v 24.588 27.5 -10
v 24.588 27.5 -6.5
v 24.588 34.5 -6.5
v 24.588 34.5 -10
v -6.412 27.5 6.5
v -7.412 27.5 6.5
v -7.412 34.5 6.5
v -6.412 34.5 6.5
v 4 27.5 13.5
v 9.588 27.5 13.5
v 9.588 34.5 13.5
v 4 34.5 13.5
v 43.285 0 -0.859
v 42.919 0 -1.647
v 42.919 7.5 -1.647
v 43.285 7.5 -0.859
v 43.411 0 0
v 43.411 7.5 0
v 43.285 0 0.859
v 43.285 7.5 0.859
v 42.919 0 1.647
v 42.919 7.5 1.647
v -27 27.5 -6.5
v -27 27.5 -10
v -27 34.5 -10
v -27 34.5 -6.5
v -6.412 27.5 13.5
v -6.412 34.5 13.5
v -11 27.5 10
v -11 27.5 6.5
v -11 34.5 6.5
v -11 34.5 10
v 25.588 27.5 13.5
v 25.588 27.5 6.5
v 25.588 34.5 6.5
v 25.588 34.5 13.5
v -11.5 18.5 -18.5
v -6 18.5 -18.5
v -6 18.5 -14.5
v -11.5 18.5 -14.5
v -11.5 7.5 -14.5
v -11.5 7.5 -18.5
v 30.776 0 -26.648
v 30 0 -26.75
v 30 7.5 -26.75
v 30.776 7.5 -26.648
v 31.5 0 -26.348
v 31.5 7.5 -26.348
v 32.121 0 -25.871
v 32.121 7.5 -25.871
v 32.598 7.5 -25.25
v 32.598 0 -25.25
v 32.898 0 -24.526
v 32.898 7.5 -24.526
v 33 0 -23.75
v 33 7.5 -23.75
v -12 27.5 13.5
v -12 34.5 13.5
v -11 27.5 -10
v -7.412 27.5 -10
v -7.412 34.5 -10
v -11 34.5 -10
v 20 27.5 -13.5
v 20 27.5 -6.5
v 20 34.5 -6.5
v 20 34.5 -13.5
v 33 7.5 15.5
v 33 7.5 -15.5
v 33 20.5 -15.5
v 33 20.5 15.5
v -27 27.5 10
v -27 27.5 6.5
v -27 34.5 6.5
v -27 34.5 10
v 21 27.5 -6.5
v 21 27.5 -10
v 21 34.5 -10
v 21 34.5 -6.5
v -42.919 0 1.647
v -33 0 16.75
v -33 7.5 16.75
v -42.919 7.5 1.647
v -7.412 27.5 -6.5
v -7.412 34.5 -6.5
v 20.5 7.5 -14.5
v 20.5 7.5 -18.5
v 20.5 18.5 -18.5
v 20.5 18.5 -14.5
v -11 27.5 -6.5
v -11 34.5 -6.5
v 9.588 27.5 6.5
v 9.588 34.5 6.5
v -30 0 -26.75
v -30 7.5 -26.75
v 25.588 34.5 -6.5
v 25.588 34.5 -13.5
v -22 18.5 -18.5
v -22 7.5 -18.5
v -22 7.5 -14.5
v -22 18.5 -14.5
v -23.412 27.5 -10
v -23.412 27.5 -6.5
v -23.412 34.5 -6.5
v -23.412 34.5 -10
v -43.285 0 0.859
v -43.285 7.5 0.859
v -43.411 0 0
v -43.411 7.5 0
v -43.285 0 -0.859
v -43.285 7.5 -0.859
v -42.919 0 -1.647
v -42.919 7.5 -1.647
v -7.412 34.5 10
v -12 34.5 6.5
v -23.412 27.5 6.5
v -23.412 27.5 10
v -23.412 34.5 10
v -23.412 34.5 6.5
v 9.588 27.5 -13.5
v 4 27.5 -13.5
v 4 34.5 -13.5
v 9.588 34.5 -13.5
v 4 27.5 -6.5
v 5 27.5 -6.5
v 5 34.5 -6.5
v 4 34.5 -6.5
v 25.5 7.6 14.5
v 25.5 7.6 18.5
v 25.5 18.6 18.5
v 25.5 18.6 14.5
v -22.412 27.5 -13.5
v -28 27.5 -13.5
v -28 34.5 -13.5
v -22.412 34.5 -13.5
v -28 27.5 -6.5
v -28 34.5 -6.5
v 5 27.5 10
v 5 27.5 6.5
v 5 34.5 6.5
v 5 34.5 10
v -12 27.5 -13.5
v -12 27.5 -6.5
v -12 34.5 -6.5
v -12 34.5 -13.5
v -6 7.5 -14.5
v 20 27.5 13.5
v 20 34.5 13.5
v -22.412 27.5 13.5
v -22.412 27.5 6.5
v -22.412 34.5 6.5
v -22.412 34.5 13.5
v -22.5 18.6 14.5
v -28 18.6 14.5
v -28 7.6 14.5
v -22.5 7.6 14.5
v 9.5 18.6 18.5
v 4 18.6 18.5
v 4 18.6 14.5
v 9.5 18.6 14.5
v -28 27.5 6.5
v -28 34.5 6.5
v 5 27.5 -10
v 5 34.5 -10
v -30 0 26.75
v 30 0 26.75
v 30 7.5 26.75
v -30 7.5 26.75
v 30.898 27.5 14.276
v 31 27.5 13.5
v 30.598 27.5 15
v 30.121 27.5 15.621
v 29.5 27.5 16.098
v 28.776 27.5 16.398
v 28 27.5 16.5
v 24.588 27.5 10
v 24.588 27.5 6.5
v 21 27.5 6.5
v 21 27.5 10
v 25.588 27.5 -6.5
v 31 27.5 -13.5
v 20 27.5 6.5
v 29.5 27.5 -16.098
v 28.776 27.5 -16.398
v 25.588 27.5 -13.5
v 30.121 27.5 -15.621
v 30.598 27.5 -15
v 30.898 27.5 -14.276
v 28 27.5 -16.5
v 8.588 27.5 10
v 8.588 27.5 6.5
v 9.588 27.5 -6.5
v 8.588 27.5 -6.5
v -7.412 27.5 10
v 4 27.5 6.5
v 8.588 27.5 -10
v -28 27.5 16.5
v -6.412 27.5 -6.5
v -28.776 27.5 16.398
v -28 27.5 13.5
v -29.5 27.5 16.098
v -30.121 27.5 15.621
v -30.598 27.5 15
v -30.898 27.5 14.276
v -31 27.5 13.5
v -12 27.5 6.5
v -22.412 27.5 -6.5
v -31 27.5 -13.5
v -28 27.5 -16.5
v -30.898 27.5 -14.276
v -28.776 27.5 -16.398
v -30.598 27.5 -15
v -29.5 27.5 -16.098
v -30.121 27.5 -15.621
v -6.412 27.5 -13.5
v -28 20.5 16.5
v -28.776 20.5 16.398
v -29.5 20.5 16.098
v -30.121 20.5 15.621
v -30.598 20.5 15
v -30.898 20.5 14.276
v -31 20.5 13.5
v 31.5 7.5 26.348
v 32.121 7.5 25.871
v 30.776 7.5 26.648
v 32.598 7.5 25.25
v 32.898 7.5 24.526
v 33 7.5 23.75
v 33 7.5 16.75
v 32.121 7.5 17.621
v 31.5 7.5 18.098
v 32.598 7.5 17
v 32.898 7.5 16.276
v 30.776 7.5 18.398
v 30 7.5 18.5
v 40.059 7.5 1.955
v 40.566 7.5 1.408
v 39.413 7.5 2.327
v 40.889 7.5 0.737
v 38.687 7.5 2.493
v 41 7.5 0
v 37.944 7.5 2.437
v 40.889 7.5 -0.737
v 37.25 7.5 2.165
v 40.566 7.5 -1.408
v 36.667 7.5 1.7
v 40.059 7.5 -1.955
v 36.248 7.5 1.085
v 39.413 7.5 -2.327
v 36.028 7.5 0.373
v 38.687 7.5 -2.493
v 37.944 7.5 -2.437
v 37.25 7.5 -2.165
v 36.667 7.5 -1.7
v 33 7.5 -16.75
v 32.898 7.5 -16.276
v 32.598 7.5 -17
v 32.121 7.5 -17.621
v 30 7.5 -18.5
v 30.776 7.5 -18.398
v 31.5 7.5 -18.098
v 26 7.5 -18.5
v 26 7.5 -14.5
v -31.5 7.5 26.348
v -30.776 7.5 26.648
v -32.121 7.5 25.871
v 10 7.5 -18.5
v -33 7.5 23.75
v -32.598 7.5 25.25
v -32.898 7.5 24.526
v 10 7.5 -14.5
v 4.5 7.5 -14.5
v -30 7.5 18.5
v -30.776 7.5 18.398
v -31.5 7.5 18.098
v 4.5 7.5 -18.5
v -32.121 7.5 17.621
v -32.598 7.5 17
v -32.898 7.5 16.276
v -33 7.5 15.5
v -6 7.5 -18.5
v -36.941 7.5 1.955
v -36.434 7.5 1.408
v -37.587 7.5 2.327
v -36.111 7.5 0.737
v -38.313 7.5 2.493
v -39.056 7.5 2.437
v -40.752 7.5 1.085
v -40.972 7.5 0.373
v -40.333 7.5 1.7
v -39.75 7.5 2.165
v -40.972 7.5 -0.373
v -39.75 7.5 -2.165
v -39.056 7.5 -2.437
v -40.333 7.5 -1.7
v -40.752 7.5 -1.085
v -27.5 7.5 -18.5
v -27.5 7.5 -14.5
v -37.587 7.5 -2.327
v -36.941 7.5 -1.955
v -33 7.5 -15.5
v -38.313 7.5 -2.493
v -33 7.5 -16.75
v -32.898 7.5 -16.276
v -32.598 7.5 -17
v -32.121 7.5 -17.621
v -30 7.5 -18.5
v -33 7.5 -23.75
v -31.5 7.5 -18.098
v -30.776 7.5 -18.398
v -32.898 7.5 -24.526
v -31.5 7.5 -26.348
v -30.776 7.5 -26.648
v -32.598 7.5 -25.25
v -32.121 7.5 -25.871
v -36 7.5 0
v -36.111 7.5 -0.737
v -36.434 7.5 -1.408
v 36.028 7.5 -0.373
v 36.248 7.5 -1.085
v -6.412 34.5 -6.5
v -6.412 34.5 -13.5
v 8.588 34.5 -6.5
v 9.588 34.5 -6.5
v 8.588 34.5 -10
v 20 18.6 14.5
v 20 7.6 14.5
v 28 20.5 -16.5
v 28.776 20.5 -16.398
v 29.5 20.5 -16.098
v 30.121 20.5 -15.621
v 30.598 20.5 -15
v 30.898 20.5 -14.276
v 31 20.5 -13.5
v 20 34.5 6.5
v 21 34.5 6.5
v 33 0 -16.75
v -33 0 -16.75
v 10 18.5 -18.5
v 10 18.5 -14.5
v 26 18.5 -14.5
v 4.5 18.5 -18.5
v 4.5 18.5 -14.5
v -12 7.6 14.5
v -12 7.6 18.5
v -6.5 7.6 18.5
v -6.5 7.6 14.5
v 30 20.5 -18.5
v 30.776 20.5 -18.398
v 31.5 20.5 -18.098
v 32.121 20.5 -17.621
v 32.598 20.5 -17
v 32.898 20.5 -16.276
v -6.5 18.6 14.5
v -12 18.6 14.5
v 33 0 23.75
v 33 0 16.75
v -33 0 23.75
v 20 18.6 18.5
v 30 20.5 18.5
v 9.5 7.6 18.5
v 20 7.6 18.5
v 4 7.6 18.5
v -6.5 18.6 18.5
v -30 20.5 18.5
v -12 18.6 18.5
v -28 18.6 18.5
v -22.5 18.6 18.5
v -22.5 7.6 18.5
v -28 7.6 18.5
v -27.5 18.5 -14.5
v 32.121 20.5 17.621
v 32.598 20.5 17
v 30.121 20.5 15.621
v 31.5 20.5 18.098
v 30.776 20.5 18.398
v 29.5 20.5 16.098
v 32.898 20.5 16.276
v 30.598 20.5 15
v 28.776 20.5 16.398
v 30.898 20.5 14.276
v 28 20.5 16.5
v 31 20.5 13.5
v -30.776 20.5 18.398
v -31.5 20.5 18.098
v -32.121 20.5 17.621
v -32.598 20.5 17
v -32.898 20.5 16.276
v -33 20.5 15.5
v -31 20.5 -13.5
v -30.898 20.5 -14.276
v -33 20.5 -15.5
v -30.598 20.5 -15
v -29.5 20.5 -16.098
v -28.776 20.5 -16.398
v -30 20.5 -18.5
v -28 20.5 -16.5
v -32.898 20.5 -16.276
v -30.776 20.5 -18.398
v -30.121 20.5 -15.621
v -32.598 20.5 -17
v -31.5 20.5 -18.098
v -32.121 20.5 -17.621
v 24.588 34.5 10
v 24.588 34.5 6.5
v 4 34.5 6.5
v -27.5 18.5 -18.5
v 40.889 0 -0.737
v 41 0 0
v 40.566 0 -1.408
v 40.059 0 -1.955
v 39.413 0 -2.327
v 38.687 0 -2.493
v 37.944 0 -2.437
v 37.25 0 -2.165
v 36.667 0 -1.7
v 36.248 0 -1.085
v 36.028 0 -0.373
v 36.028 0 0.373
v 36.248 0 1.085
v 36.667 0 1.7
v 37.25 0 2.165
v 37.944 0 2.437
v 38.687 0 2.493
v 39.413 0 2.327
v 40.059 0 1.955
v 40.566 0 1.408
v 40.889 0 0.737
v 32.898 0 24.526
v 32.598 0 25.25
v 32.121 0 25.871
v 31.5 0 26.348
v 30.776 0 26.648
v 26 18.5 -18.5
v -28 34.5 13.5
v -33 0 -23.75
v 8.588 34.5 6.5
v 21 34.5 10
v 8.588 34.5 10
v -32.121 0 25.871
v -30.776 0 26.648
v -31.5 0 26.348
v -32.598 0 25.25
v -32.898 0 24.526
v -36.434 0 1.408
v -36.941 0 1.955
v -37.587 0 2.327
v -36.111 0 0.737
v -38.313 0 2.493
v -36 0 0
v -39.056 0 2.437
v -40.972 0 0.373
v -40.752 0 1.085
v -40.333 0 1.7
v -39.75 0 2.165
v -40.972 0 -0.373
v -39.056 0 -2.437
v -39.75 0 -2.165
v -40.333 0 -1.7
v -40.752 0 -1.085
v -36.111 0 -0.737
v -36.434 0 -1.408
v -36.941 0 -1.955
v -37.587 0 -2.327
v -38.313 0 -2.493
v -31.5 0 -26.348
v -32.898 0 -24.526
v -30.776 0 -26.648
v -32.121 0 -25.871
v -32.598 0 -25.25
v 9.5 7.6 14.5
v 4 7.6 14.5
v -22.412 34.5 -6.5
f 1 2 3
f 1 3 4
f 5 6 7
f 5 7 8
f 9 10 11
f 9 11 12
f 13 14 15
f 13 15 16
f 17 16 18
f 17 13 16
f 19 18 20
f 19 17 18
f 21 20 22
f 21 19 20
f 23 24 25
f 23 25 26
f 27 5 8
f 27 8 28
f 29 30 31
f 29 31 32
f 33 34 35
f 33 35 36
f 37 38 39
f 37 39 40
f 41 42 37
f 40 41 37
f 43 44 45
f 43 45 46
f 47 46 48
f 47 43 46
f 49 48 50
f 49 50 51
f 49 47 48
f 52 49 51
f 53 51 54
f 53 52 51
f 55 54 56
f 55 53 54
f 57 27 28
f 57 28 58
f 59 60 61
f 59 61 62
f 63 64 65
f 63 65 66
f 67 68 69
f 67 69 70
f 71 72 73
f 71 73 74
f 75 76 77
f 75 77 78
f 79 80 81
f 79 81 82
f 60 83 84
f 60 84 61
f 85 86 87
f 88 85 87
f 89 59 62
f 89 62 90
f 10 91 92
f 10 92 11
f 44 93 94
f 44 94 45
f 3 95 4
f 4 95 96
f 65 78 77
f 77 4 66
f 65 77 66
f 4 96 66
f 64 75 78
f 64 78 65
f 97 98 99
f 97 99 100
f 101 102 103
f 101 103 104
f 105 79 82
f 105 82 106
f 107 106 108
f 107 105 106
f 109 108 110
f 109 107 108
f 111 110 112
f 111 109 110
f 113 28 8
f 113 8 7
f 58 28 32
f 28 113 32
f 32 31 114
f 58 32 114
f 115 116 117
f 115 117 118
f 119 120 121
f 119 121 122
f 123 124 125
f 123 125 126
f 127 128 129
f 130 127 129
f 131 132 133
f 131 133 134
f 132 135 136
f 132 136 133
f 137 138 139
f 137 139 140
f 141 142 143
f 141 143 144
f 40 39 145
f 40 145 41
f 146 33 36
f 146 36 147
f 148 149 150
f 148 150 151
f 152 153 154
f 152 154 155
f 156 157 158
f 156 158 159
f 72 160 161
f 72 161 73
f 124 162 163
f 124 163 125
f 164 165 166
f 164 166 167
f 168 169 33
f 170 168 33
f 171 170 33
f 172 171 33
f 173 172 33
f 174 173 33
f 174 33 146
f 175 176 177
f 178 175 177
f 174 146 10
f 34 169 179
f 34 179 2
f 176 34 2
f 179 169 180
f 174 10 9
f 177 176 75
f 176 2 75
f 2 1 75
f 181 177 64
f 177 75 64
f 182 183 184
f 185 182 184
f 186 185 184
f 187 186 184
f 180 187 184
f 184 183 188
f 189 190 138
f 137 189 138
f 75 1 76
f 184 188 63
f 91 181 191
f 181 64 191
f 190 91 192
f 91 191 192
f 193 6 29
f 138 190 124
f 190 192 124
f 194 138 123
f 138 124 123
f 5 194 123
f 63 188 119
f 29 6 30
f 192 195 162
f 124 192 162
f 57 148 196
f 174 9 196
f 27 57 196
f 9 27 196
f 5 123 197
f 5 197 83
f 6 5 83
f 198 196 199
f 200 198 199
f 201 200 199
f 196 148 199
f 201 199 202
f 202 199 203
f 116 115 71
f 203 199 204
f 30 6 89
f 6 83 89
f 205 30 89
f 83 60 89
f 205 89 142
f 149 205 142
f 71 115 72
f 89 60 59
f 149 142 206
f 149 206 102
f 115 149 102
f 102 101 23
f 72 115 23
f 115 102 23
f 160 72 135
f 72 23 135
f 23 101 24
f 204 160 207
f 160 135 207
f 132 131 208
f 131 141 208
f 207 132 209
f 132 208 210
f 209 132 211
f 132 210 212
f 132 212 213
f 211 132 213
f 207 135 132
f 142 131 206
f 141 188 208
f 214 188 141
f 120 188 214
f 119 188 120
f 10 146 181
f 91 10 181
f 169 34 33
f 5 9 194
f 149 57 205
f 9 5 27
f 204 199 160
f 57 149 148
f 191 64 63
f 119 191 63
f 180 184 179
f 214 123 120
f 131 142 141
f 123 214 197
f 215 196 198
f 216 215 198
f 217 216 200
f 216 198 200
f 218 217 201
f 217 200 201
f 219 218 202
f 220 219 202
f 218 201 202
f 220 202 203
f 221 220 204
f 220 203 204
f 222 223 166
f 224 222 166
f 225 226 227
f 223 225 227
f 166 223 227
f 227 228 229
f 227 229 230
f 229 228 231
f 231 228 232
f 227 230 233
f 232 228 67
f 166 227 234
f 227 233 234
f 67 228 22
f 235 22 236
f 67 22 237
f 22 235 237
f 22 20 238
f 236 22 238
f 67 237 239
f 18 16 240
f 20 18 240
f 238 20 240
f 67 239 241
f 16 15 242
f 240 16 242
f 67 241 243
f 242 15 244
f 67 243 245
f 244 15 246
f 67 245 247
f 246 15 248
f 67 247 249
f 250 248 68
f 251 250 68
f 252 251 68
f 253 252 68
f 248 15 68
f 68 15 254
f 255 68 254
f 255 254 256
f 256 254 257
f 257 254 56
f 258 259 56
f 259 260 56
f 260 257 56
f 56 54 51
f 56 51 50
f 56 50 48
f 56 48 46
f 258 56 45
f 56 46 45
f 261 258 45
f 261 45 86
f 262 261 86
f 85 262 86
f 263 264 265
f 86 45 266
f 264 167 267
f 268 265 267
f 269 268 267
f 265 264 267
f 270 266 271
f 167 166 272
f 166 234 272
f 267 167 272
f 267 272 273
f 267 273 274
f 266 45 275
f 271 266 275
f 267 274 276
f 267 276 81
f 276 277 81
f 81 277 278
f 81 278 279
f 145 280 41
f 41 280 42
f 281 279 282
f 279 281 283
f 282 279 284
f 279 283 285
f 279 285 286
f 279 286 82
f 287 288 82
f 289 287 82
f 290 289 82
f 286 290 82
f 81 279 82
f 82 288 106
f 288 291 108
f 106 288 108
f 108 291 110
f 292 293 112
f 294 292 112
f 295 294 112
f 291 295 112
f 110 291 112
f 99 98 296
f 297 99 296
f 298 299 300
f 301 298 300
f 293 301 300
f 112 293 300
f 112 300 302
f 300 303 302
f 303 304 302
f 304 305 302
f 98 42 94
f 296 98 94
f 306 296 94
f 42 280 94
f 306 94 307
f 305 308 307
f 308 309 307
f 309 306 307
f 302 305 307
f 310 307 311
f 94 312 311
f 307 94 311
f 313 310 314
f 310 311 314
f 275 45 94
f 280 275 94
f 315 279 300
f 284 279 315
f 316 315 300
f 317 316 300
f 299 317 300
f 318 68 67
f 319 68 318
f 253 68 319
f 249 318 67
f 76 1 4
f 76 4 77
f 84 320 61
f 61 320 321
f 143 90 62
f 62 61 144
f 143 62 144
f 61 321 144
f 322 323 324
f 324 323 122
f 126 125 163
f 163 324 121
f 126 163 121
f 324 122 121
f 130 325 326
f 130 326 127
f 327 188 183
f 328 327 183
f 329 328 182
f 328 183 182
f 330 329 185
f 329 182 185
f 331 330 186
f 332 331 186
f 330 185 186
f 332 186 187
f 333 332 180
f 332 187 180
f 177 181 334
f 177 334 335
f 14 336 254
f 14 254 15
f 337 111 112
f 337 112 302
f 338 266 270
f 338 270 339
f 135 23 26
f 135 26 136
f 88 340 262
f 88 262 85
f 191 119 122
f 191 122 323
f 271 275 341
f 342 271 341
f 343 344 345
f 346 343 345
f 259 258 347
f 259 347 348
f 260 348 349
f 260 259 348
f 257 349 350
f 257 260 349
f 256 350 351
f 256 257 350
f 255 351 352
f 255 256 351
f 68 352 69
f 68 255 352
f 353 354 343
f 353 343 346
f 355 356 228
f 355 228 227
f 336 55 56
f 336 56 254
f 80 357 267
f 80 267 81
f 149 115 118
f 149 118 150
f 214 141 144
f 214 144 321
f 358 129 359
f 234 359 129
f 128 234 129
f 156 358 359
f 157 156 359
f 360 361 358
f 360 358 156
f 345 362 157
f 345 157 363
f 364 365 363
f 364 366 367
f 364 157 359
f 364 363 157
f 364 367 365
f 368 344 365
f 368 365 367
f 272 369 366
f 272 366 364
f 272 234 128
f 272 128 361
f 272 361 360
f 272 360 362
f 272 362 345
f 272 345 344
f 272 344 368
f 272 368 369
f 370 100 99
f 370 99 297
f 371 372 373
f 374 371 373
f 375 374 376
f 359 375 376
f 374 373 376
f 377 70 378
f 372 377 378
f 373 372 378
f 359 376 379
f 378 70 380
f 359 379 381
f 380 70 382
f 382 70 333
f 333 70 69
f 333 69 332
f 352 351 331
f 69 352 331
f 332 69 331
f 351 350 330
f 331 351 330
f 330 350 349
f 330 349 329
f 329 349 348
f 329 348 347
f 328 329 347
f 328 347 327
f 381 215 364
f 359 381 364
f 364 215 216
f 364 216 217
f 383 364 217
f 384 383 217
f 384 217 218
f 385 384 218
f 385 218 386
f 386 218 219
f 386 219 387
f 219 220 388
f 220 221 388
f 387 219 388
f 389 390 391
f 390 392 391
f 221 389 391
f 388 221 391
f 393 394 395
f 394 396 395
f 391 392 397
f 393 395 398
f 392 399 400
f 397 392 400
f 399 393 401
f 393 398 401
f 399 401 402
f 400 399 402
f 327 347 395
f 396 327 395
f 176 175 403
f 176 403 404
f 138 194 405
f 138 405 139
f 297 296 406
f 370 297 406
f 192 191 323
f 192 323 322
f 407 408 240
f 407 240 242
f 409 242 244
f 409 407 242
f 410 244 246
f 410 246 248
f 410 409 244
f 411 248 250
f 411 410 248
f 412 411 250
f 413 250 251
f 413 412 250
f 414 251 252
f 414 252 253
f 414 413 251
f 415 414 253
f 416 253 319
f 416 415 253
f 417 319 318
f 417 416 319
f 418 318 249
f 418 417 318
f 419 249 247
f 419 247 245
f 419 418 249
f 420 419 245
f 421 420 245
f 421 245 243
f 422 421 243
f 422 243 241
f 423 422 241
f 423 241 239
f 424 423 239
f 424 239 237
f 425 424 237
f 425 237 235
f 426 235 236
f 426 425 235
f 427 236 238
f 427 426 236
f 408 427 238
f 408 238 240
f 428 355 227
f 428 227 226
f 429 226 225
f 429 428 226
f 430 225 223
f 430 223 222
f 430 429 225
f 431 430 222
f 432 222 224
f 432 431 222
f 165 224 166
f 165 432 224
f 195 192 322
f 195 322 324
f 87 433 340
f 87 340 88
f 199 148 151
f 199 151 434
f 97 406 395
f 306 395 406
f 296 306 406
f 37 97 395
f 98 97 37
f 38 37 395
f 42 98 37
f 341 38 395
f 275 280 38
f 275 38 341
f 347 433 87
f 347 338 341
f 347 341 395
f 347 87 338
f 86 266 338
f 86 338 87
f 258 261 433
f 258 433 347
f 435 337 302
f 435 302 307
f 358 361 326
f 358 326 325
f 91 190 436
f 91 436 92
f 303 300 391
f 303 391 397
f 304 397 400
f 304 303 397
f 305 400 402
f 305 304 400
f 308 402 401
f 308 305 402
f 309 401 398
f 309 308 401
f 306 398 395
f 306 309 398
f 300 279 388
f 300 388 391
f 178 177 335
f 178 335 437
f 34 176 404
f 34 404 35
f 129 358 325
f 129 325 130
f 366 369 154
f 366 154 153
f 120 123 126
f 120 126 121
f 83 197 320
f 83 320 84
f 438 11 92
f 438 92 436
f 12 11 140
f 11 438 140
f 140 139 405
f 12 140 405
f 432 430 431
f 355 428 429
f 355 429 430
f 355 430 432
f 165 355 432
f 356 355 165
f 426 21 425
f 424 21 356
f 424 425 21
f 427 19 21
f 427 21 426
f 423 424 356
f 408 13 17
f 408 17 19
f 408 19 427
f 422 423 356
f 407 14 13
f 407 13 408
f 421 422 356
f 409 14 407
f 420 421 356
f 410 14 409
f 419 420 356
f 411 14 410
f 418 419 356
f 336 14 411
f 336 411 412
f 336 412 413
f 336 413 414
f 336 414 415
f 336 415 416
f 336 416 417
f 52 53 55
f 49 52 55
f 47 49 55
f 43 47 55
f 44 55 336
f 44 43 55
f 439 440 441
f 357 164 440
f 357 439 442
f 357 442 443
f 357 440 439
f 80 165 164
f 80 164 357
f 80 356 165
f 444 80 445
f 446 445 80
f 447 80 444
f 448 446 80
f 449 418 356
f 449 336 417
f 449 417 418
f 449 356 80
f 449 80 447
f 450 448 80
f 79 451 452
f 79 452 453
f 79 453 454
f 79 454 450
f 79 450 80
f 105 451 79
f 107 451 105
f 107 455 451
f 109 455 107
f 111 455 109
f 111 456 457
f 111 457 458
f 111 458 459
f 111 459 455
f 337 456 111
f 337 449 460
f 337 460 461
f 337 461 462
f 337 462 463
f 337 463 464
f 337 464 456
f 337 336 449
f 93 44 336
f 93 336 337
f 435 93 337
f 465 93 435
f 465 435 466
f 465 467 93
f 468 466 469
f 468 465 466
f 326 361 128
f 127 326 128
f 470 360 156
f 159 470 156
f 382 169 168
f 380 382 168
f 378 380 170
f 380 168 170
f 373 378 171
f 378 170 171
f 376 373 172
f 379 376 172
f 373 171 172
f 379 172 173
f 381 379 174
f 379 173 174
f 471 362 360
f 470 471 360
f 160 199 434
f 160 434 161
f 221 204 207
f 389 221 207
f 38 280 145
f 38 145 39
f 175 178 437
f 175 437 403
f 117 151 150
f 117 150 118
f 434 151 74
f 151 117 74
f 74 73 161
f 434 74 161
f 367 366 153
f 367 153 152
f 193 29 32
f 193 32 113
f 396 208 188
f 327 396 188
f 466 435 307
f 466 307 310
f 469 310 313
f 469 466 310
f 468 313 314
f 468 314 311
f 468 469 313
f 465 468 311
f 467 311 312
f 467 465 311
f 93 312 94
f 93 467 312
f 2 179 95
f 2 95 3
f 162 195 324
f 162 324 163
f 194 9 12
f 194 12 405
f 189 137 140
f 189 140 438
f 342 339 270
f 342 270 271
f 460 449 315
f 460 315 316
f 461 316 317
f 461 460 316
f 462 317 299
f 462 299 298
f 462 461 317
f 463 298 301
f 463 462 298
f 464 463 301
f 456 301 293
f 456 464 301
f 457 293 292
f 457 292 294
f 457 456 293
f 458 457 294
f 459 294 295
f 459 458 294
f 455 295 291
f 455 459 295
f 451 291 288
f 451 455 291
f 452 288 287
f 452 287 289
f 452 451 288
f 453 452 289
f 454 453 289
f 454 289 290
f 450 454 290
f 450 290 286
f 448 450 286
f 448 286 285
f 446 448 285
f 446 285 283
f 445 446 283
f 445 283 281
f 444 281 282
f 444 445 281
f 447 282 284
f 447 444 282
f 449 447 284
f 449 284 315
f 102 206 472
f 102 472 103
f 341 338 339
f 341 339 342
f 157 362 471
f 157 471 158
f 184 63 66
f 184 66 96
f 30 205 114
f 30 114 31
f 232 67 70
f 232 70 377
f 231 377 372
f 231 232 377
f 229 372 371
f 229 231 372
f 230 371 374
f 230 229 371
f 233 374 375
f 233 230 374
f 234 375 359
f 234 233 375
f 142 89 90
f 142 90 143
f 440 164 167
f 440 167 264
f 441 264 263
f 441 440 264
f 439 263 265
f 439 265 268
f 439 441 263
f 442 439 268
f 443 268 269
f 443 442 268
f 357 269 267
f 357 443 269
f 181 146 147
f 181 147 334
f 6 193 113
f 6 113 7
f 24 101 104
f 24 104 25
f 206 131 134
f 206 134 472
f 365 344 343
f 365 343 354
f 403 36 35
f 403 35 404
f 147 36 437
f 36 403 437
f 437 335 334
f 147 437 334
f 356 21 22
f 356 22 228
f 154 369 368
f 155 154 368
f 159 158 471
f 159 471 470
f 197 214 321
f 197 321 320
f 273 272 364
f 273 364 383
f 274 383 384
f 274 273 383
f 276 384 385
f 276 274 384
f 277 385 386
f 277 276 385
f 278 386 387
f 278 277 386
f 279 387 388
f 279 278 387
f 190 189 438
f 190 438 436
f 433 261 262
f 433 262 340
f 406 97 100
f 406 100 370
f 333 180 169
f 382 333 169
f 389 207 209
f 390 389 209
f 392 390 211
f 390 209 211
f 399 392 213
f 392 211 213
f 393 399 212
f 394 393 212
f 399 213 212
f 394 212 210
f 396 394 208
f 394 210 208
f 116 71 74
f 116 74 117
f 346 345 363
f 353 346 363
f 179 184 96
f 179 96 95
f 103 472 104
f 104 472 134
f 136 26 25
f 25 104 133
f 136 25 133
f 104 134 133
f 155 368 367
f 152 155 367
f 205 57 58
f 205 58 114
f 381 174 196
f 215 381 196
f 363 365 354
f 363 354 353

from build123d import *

# Parameters (mm, degrees)
SKETCH1_R               = 2.5
BOSS_EXTRUDE1_DEPTH     = 7.5
BOSS_EXTRUDE2_DEPTH     = 20
BOSS_EXTRUDE3_DEPTH     = 7
CUT_EXTRUDE_THIN1_DEPTH = 7
SKETCH5_W               = 5.5
SKETCH5_H               = 11
CUT_EXTRUDE2_DEPTH      = 4
SKETCH6_W               = 5.5
SKETCH6_H               = 11
CUT_EXTRUDE3_DEPTH      = 4


with BuildPart() as part:
    # Sketch1 → Boss-Extrude1 (new body)
    with BuildSketch(Plane(origin=(0, 0, 0), x_dir=(1, 0, 0), z_dir=(0, 1, 0))):
        with BuildLine():
            Line((33, 16.75), (42.918528102, 1.646786754))
            ThreePointArc((42.918528102, 1.646786754), (43.410920998, 0), (42.918528102, -1.646786754))
            Line((42.918528102, -1.646786754), (33, -16.75))
            Line((33, -16.75), (33, -23.75))
            ThreePointArc((33, -23.75), (32.121320344, -25.871320344), (30, -26.75))
            Line((30, -26.75), (-30, -26.75))
            ThreePointArc((-30, -26.75), (-32.121320344, -25.871320344), (-33, -23.75))
            Line((-33, -23.75), (-33, -16.75))
            Line((-33, -16.75), (-42.918528102, -1.646786754))
            ThreePointArc((-42.918528102, -1.646786754), (-43.410920998, 0), (-42.918528102, 1.646786754))
            Line((-42.918528102, 1.646786754), (-33, 16.75))
            Line((-33, 16.75), (-33, 23.75))
            ThreePointArc((-33, 23.75), (-32.121320344, 25.871320344), (-30, 26.75))
            Line((-30, 26.75), (30, 26.75))
            ThreePointArc((30, 26.75), (32.121320344, 25.871320344), (33, 23.75))
            Line((33, 23.75), (33, 16.75))
        make_face()
        with Locations((38.5, 0)):
            Circle(SKETCH1_R, mode=Mode.SUBTRACT)
        with Locations((-38.5, 0)):
            Circle(SKETCH1_R, mode=Mode.SUBTRACT)
    extrude(amount=BOSS_EXTRUDE1_DEPTH)

    # Sketch2 → Boss-Extrude2 (add)
    with BuildSketch(Plane(origin=(0, 7.5, 0), x_dir=(1, 0, 0), z_dir=(0, 1, 0))):
        with BuildLine():
            Line((-30, 18.5), (30, 18.5))
            ThreePointArc((30, 18.5), (32.121320344, 17.621320344), (33, 15.5))
            Line((33, 15.5), (33, -15.5))
            ThreePointArc((33, -15.5), (32.121320344, -17.621320344), (30, -18.5))
            Line((30, -18.5), (-30, -18.5))
            ThreePointArc((-30, -18.5), (-32.121320344, -17.621320344), (-33, -15.5))
            Line((-33, -15.5), (-33, 15.5))
            ThreePointArc((-33, 15.5), (-32.121320344, 17.621320344), (-30, 18.5))
        make_face()
    extrude(amount=BOSS_EXTRUDE2_DEPTH)

    # Sketch3 → Boss-Extrude3 (add)
    with BuildSketch(Plane(origin=(0, 27.5, 0), x_dir=(1, 0, 0), z_dir=(0, 1, 0))):
        Polygon((-28, 13.5), (-22.4116483, 13.5), (-22.4116483, 6.5), (-23.4116483, 6.5), (-23.4116483, 10), (-27, 10), (-27, 6.5), (-28, 6.5), align=None)
        Polygon((-12, 13.5), (-6.4116483, 13.5), (-6.4116483, 6.5), (-7.4116483, 6.5), (-7.4116483, 10), (-11, 10), (-11, 6.5), (-12, 6.5), align=None)
        Polygon((4, 13.5), (9.5883517, 13.5), (9.5883517, 6.5), (8.5883517, 6.5), (8.5883517, 10), (5, 10), (5, 6.5), (4, 6.5), align=None)
        Polygon((20, 13.5), (25.5883517, 13.5), (25.5883517, 6.5), (24.5883517, 6.5), (24.5883517, 10), (21, 10), (21, 6.5), (20, 6.5), align=None)
        Polygon((-12, -6.5), (-11, -6.5), (-11, -10), (-7.4116483, -10), (-7.4116483, -6.5), (-6.4116483, -6.5), (-6.4116483, -13.5), (-12, -13.5), align=None)
        Polygon((4, -6.5), (5, -6.5), (5, -10), (8.5883517, -10), (8.5883517, -6.5), (9.5883517, -6.5), (9.5883517, -13.5), (4, -13.5), align=None)
        Polygon((20, -6.5), (21, -6.5), (21, -10), (24.5883517, -10), (24.5883517, -6.5), (25.5883517, -6.5), (25.5883517, -13.5), (20, -13.5), align=None)
        Polygon((-28, -6.5), (-27, -6.5), (-27, -10), (-23.4116483, -10), (-23.4116483, -6.5), (-22.4116483, -6.5), (-22.4116483, -13.5), (-28, -13.5), align=None)
    extrude(amount=BOSS_EXTRUDE3_DEPTH)

    # Sketch4 → Cut-Extrude-Thin1 (cut)
    with BuildSketch(Plane(origin=(0, 27.5, 0), x_dir=(1, 0, 0), z_dir=(0, 1, 0))):
        with BuildLine():
            Line((-28, 19.5), (28, 19.5))
            ThreePointArc((28, 19.5), (32.242640687, 17.742640687), (34, 13.5))
            Line((34, 13.5), (34, -13.5))
            ThreePointArc((34, -13.5), (32.242640687, -17.742640687), (28, -19.5))
            Line((28, -19.5), (-28, -19.5))
            ThreePointArc((-28, -19.5), (-32.242640687, -17.742640687), (-34, -13.5))
            Line((-34, -13.5), (-34, 13.5))
            ThreePointArc((-34, 13.5), (-32.242640687, 17.742640687), (-28, 19.5))
        make_face()
        with BuildLine():
            Line((-28, 16.5), (28, 16.5))
            ThreePointArc((28, 16.5), (30.121320344, 15.621320344), (31, 13.5))
            Line((31, 13.5), (31, -13.5))
            ThreePointArc((31, -13.5), (30.121320344, -15.621320344), (28, -16.5))
            Line((28, -16.5), (-28, -16.5))
            ThreePointArc((-28, -16.5), (-30.121320344, -15.621320344), (-31, -13.5))
            Line((-31, -13.5), (-31, 13.5))
            ThreePointArc((-31, 13.5), (-30.121320344, 15.621320344), (-28, 16.5))
        make_face(mode=Mode.SUBTRACT)
    extrude(amount=-CUT_EXTRUDE_THIN1_DEPTH, mode=Mode.SUBTRACT)

    # Sketch5 → Cut-Extrude2 (cut)
    with BuildSketch(Plane.XY.offset(18.5)):
        with Locations((-25.25, 13.1)):
            Rectangle(SKETCH5_W, SKETCH5_H)
        with Locations((-9.25, 13.1)):
            Rectangle(SKETCH5_W, SKETCH5_H)
        with Locations((6.75, 13.1)):
            Rectangle(SKETCH5_W, SKETCH5_H)
        with Locations((22.75, 13.1)):
            Rectangle(SKETCH5_W, SKETCH5_H)
    extrude(amount=-CUT_EXTRUDE2_DEPTH, mode=Mode.SUBTRACT)

    # Sketch6 → Cut-Extrude3 (cut)
    with BuildSketch(Plane(origin=(0, 0, -18.5), x_dir=(-1, 0, 0), z_dir=(0, 0, -1))):
        with Locations((-23.25, 13)):
            Rectangle(SKETCH6_W, SKETCH6_H)
        with Locations((-7.25, 13)):
            Rectangle(SKETCH6_W, SKETCH6_H)
        with Locations((8.75, 13)):
            Rectangle(SKETCH6_W, SKETCH6_H)
        with Locations((24.75, 13)):
            Rectangle(SKETCH6_W, SKETCH6_H)
    extrude(amount=-CUT_EXTRUDE3_DEPTH, mode=Mode.SUBTRACT)


solid = part.part
